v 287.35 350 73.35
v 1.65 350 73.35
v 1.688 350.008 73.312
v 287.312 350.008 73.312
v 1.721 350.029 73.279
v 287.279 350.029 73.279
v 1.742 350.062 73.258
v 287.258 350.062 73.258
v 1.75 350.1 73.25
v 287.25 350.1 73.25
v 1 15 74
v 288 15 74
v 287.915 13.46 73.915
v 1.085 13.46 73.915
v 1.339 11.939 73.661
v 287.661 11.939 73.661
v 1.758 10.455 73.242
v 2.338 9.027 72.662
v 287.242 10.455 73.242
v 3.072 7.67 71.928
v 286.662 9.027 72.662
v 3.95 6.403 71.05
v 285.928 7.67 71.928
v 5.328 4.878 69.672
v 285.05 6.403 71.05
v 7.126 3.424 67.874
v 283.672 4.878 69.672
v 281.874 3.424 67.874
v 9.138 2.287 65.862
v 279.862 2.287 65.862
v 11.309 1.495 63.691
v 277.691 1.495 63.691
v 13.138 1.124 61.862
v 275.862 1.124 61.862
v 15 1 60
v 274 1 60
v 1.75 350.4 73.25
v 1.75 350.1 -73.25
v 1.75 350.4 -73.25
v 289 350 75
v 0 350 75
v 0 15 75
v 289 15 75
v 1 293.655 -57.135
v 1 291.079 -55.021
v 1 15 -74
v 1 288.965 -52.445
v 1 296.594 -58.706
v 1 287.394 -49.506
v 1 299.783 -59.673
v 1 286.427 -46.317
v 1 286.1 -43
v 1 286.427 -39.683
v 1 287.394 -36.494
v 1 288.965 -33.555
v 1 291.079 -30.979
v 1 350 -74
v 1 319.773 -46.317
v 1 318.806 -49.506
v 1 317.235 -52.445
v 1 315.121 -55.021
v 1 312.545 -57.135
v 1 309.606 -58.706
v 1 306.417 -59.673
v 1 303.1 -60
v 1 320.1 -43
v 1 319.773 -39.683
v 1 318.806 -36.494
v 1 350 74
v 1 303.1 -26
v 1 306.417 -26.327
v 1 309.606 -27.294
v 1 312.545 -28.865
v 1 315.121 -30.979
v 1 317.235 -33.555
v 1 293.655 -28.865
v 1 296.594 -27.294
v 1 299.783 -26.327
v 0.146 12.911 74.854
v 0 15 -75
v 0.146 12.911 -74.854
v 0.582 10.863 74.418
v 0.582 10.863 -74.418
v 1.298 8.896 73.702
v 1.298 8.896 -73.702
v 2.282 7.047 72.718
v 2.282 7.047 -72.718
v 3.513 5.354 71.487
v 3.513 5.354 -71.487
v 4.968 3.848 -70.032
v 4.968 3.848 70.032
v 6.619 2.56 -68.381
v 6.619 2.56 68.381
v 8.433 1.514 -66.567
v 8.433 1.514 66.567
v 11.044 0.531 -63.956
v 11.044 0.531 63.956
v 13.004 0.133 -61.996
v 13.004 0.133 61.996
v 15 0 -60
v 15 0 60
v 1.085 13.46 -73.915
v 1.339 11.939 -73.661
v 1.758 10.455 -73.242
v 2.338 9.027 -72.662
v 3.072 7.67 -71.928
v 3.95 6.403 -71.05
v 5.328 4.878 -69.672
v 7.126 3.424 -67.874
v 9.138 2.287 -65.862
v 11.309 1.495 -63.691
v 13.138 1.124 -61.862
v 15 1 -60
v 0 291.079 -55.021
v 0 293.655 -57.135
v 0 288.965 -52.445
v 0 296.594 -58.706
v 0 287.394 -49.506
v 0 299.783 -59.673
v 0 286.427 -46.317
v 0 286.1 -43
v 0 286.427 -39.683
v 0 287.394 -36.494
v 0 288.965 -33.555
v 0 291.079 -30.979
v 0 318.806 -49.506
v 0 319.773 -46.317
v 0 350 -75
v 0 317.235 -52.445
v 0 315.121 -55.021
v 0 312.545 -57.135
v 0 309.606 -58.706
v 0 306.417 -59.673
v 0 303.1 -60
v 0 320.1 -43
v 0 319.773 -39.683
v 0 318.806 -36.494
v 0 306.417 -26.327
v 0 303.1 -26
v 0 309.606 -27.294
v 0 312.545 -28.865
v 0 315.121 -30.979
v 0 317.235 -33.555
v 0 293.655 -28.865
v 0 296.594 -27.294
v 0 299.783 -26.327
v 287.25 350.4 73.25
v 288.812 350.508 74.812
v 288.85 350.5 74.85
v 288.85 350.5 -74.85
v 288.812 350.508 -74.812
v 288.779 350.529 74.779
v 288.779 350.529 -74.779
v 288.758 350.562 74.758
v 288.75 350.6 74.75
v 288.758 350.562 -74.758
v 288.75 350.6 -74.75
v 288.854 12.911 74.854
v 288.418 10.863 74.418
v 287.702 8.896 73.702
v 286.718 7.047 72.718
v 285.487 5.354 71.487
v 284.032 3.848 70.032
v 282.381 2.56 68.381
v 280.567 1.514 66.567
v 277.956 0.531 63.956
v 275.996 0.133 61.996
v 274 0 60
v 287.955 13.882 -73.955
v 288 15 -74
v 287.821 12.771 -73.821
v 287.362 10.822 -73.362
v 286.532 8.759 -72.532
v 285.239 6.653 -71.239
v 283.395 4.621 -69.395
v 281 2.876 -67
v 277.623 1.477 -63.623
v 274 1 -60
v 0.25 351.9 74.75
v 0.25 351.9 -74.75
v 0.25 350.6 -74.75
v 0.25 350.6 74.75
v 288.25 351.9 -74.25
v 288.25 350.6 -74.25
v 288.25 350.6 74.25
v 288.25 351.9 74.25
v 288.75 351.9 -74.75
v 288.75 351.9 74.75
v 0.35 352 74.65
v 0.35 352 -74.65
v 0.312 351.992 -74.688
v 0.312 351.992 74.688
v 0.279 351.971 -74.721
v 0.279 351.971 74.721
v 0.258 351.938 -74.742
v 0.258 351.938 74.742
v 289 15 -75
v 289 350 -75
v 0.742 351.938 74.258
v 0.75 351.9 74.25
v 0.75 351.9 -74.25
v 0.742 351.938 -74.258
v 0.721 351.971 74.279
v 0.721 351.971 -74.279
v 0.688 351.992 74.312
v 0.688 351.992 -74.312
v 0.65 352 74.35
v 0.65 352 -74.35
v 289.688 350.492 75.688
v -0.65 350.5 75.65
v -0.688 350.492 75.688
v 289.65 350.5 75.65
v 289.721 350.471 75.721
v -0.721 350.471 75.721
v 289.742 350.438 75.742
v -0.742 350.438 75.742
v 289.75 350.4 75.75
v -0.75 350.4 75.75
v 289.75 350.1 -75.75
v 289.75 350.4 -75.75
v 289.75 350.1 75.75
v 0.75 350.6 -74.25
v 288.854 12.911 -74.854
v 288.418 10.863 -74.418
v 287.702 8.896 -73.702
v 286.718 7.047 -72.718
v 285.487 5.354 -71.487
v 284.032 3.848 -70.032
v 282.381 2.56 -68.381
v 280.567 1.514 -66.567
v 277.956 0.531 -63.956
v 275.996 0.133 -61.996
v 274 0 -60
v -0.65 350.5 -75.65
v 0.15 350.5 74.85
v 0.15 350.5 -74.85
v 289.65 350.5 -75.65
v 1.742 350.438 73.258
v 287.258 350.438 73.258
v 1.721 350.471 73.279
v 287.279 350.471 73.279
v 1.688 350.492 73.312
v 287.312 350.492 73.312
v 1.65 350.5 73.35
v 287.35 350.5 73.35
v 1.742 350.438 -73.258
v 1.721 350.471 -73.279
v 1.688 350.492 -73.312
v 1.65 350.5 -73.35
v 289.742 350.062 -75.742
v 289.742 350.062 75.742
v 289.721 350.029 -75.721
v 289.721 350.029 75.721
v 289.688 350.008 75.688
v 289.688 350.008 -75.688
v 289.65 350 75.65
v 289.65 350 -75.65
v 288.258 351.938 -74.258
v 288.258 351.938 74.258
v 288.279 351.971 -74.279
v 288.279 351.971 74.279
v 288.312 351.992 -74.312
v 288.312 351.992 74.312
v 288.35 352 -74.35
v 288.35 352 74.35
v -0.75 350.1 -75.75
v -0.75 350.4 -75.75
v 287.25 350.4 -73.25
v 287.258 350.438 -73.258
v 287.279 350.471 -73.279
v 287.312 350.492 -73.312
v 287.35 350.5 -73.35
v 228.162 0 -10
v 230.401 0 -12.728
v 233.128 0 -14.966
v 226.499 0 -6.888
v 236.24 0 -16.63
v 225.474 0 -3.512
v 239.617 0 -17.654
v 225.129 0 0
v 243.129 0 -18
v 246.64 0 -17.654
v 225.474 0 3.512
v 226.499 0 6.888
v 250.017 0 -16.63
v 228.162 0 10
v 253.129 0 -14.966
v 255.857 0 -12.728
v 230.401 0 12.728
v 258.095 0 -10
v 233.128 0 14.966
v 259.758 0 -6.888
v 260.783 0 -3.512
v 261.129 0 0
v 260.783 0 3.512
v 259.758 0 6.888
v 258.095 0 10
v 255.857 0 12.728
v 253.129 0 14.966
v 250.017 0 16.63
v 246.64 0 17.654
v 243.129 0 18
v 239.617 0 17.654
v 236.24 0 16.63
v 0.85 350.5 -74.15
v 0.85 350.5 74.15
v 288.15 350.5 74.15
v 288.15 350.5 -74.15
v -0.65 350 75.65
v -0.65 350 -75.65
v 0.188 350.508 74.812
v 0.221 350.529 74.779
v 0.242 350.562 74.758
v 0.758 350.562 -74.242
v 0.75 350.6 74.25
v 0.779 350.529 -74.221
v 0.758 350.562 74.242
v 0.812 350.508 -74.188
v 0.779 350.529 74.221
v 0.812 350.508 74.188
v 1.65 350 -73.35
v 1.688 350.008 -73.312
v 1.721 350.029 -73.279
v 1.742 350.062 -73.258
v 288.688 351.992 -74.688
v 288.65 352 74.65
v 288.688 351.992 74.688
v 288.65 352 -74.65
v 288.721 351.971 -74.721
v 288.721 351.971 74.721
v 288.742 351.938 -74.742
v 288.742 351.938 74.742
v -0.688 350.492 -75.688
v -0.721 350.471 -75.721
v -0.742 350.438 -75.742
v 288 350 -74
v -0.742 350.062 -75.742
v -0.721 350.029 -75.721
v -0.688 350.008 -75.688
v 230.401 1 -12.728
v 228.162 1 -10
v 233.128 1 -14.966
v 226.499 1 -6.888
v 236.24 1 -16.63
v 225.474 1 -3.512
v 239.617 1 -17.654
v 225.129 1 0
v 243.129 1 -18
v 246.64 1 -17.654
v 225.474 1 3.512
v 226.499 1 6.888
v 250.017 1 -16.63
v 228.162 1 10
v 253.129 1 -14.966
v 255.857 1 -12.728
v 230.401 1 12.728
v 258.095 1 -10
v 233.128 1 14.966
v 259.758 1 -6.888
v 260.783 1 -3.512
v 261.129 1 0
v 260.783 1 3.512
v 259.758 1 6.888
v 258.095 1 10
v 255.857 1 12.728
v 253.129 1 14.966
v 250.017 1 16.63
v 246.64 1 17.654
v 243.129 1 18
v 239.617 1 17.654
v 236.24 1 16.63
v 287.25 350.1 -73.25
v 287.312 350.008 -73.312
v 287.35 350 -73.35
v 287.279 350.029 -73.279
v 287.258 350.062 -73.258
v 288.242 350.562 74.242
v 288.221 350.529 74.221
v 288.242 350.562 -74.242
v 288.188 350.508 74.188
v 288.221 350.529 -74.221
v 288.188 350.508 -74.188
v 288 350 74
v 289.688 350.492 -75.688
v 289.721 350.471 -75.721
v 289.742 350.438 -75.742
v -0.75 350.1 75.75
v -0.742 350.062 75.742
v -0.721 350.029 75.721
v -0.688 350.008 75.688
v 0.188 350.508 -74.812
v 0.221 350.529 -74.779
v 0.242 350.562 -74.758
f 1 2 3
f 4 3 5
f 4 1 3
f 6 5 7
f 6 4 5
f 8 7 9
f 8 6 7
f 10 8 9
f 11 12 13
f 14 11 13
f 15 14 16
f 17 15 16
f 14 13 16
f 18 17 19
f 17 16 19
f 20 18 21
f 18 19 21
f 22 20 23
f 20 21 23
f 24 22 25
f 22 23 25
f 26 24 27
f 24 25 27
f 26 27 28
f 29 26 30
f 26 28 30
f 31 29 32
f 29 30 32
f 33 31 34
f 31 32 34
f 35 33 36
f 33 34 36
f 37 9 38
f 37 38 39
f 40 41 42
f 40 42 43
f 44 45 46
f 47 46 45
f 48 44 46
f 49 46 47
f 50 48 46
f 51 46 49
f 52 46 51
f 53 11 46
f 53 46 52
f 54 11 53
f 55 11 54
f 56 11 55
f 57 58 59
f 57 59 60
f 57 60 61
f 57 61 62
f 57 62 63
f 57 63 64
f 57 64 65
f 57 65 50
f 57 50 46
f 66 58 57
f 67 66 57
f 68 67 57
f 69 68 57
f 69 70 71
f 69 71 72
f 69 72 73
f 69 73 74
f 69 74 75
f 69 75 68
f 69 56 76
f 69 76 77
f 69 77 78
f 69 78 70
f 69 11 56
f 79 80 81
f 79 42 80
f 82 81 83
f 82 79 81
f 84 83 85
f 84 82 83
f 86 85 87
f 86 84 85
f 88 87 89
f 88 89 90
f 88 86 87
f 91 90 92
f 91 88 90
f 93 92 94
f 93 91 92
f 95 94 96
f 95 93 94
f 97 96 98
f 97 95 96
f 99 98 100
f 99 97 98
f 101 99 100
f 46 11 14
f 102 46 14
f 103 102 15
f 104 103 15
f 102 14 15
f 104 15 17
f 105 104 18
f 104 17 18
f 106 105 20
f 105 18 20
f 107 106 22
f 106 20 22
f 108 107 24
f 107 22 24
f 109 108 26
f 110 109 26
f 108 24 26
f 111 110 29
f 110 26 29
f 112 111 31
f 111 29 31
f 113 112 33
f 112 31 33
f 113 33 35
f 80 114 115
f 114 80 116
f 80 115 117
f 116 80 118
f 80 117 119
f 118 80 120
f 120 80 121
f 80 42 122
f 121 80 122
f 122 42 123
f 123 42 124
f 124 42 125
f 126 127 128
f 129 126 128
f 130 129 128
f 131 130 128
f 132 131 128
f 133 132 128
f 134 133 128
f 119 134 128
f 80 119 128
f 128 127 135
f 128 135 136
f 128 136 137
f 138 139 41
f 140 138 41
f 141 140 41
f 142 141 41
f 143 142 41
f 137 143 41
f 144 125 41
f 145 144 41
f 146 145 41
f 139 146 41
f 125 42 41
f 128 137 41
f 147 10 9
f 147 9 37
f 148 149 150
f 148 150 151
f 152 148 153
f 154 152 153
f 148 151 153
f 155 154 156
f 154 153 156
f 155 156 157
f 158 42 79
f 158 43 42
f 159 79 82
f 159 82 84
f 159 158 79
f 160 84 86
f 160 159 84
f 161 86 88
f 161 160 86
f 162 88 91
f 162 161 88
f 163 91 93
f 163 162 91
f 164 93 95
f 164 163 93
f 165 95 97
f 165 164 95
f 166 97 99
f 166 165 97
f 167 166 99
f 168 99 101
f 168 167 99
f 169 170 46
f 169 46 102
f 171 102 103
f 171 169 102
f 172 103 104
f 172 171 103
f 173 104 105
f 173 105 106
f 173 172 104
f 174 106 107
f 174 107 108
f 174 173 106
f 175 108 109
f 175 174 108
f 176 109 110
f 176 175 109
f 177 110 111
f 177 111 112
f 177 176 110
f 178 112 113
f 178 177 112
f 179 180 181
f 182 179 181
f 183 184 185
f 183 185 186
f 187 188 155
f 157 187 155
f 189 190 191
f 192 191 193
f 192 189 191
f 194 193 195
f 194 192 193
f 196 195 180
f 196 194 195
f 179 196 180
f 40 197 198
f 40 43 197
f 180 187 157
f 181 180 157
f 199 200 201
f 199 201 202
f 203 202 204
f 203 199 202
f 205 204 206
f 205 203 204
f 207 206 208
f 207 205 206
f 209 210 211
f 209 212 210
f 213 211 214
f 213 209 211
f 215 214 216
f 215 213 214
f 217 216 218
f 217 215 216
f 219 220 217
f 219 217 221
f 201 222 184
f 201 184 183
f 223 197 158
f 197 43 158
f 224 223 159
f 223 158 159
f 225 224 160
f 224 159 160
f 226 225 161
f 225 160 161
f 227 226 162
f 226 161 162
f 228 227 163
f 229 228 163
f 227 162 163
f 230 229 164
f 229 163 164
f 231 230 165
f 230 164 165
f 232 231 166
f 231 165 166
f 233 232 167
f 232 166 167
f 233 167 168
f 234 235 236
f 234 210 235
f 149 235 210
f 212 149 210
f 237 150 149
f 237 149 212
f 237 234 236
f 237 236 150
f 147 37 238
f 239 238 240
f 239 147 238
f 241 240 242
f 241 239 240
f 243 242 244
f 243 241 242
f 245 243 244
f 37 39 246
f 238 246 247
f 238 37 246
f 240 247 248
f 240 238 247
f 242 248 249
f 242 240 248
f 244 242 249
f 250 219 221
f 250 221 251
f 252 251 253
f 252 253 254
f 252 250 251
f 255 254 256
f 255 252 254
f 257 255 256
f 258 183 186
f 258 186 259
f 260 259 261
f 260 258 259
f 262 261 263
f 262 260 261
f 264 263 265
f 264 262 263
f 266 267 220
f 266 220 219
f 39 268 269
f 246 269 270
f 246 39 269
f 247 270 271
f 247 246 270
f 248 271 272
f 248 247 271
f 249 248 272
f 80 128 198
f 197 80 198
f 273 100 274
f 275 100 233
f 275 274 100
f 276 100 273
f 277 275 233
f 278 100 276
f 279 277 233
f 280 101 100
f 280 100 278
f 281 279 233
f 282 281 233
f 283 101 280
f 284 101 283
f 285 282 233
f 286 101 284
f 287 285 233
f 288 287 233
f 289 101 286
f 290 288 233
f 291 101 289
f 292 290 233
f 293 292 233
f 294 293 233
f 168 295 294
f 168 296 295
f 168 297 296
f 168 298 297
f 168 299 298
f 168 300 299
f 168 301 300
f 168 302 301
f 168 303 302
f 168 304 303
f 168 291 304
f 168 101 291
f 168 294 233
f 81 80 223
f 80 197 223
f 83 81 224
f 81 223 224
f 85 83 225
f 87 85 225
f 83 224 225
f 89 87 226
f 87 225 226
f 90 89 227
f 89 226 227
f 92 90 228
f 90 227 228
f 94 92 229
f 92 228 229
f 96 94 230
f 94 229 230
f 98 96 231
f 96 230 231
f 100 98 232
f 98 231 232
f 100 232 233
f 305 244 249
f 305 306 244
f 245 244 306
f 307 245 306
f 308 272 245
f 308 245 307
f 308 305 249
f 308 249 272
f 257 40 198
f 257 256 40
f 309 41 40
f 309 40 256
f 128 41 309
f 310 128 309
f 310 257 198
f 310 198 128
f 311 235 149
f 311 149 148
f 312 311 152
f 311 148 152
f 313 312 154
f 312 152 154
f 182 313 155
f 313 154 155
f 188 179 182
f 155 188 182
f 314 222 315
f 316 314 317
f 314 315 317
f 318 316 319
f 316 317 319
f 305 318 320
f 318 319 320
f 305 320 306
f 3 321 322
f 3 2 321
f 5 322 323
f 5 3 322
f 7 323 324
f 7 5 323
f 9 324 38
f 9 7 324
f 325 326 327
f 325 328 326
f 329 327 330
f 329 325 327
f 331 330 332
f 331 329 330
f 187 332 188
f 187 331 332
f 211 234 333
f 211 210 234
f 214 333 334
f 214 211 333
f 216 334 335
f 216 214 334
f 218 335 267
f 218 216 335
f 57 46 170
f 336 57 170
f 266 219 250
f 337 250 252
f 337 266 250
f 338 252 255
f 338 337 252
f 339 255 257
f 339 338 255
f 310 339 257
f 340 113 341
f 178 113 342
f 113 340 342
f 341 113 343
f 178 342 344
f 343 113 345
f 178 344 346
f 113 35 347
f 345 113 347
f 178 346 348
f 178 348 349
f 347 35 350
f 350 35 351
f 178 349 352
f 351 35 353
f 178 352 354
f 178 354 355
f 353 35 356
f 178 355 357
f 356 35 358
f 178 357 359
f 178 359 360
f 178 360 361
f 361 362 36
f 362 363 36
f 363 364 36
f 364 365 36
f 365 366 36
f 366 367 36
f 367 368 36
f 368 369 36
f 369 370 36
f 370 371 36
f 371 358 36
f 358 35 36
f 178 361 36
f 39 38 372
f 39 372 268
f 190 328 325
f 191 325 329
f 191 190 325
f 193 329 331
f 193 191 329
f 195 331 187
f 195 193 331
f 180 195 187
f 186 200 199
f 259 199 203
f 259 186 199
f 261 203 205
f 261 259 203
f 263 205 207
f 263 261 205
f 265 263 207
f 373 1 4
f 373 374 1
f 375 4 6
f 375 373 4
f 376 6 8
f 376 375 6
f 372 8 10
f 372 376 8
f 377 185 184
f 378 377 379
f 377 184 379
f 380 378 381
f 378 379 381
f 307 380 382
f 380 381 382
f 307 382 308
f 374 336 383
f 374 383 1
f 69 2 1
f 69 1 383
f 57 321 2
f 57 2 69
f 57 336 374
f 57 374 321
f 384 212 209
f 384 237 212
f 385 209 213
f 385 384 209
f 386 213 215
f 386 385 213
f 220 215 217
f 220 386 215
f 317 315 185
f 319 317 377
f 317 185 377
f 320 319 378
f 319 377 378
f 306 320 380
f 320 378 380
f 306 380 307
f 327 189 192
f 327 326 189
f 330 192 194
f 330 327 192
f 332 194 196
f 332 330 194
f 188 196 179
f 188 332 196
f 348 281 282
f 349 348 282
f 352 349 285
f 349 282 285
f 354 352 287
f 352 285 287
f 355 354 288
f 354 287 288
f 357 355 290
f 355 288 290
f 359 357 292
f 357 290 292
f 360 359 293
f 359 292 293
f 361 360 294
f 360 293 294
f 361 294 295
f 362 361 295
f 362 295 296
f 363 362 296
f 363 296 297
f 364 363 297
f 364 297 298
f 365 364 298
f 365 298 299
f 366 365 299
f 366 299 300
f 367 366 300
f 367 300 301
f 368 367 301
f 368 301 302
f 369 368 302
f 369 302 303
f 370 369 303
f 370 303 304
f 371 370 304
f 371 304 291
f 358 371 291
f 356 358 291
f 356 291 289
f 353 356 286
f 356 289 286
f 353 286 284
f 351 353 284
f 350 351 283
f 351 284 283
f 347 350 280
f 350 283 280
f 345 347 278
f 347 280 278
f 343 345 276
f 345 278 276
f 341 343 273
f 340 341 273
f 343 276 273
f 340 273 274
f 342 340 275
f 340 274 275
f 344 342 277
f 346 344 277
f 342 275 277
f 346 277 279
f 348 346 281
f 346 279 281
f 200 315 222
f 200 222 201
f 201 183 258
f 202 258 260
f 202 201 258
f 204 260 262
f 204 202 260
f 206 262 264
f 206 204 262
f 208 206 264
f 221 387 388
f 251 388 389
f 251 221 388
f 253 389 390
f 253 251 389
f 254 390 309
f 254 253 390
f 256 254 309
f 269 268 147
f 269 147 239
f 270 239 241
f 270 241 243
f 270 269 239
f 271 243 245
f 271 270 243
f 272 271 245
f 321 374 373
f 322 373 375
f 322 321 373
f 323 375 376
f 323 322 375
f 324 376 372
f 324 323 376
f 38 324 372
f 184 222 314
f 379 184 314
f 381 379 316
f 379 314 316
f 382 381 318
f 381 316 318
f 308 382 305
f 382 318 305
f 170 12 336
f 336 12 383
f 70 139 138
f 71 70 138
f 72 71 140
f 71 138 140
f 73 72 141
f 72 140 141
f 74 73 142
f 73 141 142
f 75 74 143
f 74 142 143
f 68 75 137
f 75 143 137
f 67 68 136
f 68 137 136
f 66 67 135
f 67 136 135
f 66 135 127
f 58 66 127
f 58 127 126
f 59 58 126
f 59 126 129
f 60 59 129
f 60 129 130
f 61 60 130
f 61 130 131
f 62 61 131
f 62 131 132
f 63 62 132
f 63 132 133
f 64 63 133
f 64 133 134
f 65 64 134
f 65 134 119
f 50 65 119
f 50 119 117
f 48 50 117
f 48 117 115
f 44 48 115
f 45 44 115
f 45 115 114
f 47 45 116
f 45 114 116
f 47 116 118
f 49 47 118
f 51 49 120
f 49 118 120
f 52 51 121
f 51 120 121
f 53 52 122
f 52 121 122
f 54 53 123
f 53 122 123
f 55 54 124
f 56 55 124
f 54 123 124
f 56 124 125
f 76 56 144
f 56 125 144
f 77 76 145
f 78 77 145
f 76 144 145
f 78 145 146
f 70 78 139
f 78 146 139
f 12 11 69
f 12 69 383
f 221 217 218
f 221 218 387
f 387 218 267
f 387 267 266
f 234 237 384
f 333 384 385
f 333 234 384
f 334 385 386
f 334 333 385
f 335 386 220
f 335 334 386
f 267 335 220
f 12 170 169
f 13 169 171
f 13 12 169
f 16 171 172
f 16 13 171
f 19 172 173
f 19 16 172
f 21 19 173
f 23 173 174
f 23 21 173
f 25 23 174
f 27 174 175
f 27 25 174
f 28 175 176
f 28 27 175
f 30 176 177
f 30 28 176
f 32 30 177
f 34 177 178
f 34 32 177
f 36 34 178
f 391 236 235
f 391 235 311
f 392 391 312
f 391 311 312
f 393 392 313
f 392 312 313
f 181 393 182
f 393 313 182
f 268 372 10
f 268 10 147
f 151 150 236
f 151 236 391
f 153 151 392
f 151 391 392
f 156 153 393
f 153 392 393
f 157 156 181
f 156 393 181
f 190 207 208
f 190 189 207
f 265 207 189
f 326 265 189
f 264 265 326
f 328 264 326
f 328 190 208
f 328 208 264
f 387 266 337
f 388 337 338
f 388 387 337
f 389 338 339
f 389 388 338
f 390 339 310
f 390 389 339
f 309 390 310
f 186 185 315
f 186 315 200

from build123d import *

# Parameters (mm, degrees)
SKETCH1_W           = 289
SKETCH1_H           = 350
BOSS_EXTRUDE1_DEPTH = 75
FILLET1_R           = 15
SHELL1_T            = -1
SKETCH5_R           = 18
CUT_EXTRUDE1_DEPTH  = 10
SKETCH6_R           = 17
CUT_EXTRUDE2_DEPTH  = 10


with BuildPart() as part:
    # Sketch1 → Boss-Extrude1 (new, symmetric)
    with BuildSketch(Plane.XY):
        with Locations((144.5, 175)):
            Rectangle(SKETCH1_W, SKETCH1_H)
    extrude(amount=BOSS_EXTRUDE1_DEPTH, both=True)

    # Fillet1
    fillet1_edges = [part.edges().sort_by_distance(p)[0] for p in [
        (144.5, 0, 75),
        (289, 0, 0),
        (0, 0, 0),
        (144.5, 0, -75),
    ]]
    fillet(fillet1_edges, radius=FILLET1_R)

    # Shell1
    shell1_openings = [part.faces().sort_by_distance(p)[0] for p in [
        (144.5, 350, 0),
    ]]
    offset(amount=SHELL1_T, openings=shell1_openings)

    # Sweep1: sweep along a path in Sketch3
    with BuildLine(Plane(origin=(0, 350, 0), x_dir=(1, 0, 0), z_dir=(0, 1, 0))) as sweep1_path:
        Line((288.5, -74.5), (288.5, 74.5))
        Line((288.5, 74.5), (0.5, 74.5))
        Line((0.5, 74.5), (0.5, -74.5))
        Line((0.5, -74.5), (288.5, -74.5))
    # Sketch4 → Sweep1 (sweep)
    with BuildSketch(Plane.XY):
        with BuildLine():
            Line((-0.65, 350), (1.65, 350))
            ThreePointArc((1.65, 350), (1.720710678, 350.029289322), (1.75, 350.1))
            Line((1.75, 350.1), (1.75, 350.4))
            ThreePointArc((1.75, 350.4), (1.720710678, 350.470710678), (1.65, 350.5))
            Line((1.65, 350.5), (0.85, 350.5))
            ThreePointArc((0.85, 350.5), (0.779289322, 350.529289322), (0.75, 350.6))
            Line((0.75, 350.6), (0.75, 351.9))
            ThreePointArc((0.75, 351.9), (0.720710678, 351.970710678), (0.65, 352))
            Line((0.65, 352), (0.35, 352))
            ThreePointArc((0.35, 352), (0.279289322, 351.970710678), (0.25, 351.9))
            Line((0.25, 351.9), (0.25, 350.6))
            ThreePointArc((0.25, 350.6), (0.220710678, 350.529289322), (0.15, 350.5))
            Line((0.15, 350.5), (-0.65, 350.5))
            ThreePointArc((-0.65, 350.5), (-0.720710678, 350.470710678), (-0.75, 350.4))
            Line((-0.75, 350.4), (-0.75, 350.1))
            ThreePointArc((-0.75, 350.1), (-0.720710678, 350.029289322), (-0.65, 350))
        make_face()
    sweep(path=sweep1_path.line, transition=Transition.RIGHT)

    # Sketch5 → Cut-Extrude1 (cut)
    with BuildSketch(Plane.XZ):
        with Locations(Location((243.128583469, 0, 0), (0, 0, 270))):
            Circle(SKETCH5_R)
    extrude(amount=-CUT_EXTRUDE1_DEPTH, mode=Mode.SUBTRACT)

    # Sketch6 → Cut-Extrude2 (cut)
    with BuildSketch(Plane.ZY):
        with Locations((-43, 303.1)):
            Circle(SKETCH6_R)
    extrude(amount=-CUT_EXTRUDE2_DEPTH, mode=Mode.SUBTRACT)


solid = part.part
